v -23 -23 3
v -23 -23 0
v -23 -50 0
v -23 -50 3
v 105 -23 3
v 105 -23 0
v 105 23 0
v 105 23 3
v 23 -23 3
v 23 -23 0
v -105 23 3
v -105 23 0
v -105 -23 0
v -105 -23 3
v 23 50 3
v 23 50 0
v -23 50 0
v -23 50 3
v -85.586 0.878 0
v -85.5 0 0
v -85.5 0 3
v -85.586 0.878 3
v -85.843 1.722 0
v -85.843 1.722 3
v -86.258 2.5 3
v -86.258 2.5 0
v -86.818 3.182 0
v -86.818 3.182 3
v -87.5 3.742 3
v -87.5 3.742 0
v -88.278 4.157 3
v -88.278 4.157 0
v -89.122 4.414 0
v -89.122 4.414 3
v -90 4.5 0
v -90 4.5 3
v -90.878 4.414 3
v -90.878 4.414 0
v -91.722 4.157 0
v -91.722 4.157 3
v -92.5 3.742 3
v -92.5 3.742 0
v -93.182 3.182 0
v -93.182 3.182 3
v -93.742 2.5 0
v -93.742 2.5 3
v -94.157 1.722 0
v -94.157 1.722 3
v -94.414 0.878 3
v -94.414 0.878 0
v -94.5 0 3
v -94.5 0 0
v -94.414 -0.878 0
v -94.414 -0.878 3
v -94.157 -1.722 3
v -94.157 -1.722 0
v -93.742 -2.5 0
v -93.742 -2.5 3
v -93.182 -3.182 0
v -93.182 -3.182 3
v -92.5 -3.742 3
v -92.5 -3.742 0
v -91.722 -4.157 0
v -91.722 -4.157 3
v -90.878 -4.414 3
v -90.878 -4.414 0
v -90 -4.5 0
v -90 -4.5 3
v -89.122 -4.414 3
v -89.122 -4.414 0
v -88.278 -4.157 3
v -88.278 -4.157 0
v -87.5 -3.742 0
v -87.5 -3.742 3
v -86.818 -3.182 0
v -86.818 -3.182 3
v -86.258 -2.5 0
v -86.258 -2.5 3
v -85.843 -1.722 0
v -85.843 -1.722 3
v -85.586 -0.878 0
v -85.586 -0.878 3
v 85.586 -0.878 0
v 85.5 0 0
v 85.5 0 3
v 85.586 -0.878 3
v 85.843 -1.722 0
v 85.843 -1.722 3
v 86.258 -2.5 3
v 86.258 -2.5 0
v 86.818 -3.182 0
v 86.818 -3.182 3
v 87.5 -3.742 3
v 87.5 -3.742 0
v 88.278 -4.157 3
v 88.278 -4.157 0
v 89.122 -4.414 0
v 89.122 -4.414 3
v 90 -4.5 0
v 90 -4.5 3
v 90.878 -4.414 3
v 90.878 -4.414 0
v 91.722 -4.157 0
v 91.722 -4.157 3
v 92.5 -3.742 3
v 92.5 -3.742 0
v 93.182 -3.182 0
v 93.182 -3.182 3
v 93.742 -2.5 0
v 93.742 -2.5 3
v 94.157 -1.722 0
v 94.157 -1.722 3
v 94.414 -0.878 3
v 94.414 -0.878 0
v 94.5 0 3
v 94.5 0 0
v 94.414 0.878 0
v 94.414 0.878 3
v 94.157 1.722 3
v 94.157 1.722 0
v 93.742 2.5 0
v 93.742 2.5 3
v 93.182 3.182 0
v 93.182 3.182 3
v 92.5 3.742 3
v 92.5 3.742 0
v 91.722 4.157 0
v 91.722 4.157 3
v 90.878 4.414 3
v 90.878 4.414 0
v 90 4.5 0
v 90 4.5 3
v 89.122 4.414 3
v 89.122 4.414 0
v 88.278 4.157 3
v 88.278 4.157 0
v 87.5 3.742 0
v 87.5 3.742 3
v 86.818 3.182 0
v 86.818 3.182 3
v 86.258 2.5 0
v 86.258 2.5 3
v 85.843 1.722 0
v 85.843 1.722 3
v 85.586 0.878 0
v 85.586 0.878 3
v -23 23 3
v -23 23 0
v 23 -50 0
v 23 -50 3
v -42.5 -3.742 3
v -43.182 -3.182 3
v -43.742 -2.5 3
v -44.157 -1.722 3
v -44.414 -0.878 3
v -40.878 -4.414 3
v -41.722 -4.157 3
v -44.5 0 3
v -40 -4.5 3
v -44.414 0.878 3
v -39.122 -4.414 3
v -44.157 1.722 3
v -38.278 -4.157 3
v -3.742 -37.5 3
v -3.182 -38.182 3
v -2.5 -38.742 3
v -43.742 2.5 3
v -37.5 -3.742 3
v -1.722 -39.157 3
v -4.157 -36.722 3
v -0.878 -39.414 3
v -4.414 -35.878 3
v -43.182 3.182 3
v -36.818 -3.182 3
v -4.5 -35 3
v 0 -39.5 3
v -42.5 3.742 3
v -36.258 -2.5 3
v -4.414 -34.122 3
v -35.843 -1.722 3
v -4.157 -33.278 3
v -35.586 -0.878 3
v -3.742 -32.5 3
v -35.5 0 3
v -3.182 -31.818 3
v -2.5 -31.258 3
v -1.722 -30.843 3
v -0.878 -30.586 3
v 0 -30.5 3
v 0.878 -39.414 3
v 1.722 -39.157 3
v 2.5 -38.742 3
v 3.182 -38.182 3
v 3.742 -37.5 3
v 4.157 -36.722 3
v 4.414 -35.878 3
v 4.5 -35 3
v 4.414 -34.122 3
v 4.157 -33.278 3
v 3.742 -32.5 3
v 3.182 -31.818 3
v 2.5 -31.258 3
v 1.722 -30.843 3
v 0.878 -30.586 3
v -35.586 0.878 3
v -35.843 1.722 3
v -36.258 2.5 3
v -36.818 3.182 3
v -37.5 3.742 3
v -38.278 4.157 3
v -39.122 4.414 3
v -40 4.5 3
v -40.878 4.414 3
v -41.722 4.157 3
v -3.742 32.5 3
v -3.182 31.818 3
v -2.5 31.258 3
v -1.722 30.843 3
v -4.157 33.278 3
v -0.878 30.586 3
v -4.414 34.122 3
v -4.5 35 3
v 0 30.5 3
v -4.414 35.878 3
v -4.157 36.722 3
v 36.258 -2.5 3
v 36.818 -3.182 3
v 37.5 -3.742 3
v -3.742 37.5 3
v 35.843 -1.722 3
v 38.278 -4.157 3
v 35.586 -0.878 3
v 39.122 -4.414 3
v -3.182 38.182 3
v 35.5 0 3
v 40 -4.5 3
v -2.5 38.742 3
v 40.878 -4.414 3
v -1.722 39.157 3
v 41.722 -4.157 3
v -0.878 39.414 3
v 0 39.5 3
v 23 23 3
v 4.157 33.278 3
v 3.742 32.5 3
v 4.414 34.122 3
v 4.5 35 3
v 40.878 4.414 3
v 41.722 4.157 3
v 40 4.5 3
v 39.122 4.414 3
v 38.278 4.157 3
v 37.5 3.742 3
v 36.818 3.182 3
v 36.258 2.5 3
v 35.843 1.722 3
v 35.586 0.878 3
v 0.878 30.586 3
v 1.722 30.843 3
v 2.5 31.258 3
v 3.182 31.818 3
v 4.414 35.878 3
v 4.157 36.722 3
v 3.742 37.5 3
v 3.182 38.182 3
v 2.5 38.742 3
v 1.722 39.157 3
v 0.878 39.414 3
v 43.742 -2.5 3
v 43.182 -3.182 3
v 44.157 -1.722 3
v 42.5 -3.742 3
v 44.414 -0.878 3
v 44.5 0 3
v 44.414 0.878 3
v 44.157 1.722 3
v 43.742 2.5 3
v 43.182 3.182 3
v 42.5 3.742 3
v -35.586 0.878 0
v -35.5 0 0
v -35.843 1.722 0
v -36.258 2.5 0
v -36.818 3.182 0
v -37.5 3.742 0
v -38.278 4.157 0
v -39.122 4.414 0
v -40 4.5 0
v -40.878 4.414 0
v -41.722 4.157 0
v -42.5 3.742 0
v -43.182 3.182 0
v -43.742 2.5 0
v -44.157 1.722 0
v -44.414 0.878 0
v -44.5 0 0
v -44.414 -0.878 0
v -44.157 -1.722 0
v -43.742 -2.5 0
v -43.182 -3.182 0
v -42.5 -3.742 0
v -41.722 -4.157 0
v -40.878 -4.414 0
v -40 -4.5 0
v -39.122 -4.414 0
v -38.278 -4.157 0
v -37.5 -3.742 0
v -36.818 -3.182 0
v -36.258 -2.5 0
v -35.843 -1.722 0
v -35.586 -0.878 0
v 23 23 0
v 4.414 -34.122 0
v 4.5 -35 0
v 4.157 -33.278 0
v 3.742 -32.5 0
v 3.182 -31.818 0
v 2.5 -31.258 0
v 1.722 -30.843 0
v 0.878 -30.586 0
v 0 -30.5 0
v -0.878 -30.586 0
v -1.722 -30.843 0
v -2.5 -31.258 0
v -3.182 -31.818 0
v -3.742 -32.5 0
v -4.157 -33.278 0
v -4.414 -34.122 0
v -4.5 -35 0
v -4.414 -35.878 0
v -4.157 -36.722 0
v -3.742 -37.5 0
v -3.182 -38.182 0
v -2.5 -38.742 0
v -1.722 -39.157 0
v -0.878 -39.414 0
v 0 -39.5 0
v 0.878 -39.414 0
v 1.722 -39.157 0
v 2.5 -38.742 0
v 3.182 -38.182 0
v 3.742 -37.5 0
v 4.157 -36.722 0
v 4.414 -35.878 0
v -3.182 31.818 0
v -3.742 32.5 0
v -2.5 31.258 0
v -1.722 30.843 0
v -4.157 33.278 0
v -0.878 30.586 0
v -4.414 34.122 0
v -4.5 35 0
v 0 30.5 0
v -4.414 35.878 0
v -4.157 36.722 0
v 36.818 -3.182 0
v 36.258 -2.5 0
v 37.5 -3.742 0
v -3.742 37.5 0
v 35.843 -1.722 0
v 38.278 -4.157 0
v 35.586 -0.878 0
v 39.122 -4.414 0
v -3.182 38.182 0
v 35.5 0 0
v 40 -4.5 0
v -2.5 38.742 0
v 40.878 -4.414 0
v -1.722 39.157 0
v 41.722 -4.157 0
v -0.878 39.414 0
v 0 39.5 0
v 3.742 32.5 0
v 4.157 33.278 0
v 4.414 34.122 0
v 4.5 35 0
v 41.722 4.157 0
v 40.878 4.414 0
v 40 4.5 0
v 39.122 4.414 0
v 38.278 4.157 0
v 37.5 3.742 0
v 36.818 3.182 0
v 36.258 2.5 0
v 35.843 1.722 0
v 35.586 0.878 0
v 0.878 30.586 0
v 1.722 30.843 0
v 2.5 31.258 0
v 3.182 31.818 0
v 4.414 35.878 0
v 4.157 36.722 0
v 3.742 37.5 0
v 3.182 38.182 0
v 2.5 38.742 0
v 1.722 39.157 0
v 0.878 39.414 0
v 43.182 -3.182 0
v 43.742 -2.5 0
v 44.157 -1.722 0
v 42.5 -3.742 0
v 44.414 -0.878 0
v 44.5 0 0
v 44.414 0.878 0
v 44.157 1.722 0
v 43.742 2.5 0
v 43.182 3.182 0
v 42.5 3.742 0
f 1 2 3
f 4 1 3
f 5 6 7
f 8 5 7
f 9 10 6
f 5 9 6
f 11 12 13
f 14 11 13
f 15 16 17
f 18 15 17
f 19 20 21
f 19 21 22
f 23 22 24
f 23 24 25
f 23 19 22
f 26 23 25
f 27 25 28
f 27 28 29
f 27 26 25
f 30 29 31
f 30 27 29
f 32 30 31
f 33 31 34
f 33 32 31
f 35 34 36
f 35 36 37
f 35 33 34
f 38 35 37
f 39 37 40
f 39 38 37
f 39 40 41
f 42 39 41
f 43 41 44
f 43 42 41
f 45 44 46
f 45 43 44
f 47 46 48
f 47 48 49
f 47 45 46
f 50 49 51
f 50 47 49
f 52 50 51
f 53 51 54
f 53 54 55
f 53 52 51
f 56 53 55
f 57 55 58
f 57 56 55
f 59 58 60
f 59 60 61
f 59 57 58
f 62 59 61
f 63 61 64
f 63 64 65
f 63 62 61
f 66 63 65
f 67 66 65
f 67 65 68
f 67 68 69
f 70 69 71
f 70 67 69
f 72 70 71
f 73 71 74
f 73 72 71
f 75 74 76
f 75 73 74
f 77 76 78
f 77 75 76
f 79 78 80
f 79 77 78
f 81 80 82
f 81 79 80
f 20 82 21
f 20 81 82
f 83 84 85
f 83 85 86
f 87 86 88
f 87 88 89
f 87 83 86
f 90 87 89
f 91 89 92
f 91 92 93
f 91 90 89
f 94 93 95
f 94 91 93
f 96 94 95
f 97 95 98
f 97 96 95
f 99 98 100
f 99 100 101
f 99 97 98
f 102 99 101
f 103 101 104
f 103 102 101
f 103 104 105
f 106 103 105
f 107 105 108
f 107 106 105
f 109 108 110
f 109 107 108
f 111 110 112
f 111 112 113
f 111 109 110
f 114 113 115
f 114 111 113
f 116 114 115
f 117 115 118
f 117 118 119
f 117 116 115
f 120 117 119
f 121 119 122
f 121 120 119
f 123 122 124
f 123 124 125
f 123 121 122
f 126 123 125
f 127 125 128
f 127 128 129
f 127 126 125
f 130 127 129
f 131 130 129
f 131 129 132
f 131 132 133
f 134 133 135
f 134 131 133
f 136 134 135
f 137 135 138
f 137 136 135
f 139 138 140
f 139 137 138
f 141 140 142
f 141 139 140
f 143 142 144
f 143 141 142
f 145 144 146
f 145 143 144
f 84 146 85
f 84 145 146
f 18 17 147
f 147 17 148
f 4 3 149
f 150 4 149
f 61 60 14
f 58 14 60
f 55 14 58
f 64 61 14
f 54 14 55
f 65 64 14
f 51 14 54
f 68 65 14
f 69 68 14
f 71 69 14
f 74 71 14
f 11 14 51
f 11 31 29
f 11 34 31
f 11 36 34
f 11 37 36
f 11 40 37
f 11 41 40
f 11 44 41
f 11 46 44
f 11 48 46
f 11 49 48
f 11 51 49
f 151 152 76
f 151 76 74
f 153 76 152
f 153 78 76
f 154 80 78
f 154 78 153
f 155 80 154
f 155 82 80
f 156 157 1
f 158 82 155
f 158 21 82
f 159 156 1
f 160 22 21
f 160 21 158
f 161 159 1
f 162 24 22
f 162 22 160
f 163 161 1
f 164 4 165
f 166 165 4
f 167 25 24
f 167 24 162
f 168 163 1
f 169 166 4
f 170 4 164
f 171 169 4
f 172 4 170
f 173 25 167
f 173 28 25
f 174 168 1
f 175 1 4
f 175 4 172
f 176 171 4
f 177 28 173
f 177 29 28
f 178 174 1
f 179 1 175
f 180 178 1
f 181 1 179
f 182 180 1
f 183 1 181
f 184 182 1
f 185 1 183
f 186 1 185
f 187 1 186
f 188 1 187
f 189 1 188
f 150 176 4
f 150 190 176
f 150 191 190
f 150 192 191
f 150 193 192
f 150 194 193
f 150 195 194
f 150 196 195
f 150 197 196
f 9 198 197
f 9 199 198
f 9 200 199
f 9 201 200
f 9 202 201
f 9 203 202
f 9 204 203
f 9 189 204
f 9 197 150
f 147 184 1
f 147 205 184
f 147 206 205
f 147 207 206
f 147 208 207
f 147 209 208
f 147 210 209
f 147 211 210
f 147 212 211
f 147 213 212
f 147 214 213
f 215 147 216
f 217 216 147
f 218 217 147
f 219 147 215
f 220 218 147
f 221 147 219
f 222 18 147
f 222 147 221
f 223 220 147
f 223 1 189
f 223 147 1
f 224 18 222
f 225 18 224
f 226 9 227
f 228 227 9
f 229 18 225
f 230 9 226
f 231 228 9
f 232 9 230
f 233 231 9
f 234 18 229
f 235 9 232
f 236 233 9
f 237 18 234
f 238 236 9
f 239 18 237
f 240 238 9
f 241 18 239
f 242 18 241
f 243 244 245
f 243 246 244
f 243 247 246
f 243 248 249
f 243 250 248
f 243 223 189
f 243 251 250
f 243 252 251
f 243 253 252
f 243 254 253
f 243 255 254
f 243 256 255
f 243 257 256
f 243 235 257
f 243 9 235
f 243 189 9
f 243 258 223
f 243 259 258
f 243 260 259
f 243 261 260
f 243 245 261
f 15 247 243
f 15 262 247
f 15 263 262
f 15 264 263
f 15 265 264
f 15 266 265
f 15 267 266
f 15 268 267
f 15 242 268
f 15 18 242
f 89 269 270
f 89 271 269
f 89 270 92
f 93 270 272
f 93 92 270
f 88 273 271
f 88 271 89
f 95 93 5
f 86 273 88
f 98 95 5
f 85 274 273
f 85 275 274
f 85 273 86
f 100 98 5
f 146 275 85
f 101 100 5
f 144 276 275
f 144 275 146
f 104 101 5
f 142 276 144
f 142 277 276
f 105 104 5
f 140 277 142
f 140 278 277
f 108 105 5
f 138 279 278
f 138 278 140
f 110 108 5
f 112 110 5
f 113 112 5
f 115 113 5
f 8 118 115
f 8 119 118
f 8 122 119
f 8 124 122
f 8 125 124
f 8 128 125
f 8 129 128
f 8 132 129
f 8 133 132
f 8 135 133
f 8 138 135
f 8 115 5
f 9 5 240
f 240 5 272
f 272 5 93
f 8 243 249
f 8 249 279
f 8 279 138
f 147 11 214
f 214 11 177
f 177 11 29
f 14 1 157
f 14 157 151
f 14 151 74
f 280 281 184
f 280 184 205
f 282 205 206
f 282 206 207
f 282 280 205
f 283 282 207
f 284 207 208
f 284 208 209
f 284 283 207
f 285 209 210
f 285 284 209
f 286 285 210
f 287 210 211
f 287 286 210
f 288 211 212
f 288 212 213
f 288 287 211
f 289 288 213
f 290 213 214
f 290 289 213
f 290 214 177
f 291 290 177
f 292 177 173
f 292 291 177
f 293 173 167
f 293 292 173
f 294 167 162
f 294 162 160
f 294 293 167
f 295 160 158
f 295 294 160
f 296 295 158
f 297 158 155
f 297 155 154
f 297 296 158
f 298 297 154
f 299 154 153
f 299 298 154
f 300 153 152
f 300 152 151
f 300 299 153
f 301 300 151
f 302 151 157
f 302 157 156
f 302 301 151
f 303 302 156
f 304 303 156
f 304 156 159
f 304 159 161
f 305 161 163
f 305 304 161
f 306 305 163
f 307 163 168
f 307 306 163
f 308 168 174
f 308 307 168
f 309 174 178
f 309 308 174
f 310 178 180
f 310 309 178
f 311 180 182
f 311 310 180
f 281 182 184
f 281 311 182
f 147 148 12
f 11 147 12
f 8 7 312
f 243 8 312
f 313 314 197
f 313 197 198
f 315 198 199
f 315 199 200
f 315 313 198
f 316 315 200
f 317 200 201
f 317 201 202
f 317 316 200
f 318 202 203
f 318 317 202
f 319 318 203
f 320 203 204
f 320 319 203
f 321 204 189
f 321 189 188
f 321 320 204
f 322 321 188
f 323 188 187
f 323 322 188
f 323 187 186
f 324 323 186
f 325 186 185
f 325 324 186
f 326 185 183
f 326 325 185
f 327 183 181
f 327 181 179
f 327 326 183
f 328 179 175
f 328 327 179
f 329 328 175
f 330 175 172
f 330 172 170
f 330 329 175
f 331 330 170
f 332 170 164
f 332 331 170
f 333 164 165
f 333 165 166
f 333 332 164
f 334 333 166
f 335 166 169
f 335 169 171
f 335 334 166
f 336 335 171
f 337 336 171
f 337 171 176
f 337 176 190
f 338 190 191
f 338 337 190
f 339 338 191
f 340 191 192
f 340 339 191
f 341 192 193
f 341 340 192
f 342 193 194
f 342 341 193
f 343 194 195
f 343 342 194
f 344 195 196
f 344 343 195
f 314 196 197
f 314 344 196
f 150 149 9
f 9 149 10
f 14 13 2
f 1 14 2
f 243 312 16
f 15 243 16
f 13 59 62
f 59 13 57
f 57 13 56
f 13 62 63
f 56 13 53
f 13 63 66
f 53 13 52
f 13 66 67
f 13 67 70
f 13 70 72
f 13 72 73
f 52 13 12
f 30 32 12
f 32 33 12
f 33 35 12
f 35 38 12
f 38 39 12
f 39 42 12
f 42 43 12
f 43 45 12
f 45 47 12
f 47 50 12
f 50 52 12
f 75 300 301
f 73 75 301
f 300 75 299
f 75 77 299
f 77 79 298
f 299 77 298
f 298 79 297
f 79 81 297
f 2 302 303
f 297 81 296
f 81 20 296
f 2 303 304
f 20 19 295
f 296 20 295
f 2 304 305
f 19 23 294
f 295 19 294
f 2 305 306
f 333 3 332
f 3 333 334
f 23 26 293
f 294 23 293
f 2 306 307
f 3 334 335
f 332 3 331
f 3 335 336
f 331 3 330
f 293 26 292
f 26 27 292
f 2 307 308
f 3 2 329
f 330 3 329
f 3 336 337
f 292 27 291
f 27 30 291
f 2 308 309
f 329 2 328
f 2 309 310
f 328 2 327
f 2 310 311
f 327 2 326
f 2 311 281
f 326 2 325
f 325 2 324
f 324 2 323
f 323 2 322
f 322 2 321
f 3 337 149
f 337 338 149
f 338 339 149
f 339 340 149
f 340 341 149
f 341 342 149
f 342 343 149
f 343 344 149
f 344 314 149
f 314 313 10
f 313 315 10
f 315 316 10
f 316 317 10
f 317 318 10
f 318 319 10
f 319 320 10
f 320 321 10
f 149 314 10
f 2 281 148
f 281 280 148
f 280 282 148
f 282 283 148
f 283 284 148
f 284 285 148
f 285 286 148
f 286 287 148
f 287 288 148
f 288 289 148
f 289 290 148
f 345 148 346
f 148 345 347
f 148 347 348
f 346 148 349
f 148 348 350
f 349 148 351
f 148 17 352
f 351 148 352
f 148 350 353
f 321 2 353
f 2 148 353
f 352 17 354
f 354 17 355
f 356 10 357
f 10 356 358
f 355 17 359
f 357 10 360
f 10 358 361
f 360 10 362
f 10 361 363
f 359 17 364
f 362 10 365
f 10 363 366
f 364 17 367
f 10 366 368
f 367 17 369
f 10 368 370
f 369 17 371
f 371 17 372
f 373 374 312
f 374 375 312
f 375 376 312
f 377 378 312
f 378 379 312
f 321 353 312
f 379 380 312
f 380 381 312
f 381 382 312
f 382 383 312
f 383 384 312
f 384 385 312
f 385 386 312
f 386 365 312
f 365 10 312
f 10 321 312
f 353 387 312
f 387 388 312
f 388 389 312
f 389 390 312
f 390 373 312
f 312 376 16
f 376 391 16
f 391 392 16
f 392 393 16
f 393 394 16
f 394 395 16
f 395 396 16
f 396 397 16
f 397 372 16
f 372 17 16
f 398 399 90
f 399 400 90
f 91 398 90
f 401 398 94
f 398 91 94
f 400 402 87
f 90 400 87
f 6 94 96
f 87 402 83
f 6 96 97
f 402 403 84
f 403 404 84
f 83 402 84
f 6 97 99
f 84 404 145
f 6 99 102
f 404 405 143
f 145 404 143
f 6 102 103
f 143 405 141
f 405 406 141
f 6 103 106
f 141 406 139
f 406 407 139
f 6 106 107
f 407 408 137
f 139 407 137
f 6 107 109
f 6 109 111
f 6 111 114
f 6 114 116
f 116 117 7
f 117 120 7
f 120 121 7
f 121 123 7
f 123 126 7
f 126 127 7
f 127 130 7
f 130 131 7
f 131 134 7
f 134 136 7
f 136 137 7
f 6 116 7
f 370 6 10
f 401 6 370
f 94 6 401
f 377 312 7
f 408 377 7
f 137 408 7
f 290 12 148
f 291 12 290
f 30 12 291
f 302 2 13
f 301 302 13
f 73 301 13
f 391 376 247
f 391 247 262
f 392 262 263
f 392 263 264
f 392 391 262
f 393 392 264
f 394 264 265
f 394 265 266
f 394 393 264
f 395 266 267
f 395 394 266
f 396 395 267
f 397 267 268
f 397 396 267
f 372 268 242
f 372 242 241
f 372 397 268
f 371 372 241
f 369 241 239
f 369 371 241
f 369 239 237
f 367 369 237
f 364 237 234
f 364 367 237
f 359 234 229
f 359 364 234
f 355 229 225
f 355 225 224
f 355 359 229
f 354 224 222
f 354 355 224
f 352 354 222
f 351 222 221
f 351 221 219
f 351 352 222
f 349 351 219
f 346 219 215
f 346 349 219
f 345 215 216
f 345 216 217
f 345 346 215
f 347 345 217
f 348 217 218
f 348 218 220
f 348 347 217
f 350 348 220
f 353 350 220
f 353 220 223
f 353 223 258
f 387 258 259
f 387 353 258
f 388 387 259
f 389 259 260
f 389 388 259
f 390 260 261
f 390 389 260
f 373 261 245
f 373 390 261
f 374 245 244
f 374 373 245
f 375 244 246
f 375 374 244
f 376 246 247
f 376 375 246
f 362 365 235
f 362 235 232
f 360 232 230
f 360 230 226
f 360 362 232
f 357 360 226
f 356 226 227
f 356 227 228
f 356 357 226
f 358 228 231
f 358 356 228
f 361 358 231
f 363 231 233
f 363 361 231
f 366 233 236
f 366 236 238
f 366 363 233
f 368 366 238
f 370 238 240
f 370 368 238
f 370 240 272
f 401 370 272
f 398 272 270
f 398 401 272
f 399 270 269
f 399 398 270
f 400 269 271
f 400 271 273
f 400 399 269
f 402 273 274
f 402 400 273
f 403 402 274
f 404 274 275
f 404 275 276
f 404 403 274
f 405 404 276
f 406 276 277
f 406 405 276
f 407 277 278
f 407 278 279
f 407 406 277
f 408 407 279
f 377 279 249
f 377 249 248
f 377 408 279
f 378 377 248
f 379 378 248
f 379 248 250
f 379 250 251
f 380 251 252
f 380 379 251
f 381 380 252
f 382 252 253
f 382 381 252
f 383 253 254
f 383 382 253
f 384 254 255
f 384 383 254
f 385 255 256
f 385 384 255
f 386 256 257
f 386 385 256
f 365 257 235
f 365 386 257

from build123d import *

# Parameters (mm, degrees)
SKETCH_1_R      = 4.5
EXTRUDE_1_DEPTH = 3


with BuildPart() as part:
    # Эскиз1 → Бобышка-Вытянуть1 (new body)
    with BuildSketch(Plane.XY):
        Polygon((23, -23), (105, -23), (105, 23), (23, 23), (23, 50), (-23, 50), (-23, 23), (-105, 23), (-105, -23), (-23, -23), (-23, -50), (23, -50), align=None)
        with Locations((0, 35)):
            Circle(SKETCH_1_R, mode=Mode.SUBTRACT)
        with Locations((0, -35)):
            Circle(SKETCH_1_R, mode=Mode.SUBTRACT)
        with Locations((-90, 0)):
            Circle(SKETCH_1_R, mode=Mode.SUBTRACT)
        with Locations((-40, 0)):
            Circle(SKETCH_1_R, mode=Mode.SUBTRACT)
        with Locations(Location((40, 0, 0), (0, 0, 180))):  # turned: the seam where the file's is
            Circle(SKETCH_1_R, mode=Mode.SUBTRACT)
        with Locations(Location((90, 0, 0), (0, 0, 180))):  # turned: the seam where the file's is
            Circle(SKETCH_1_R, mode=Mode.SUBTRACT)
    extrude(amount=EXTRUDE_1_DEPTH)


solid = part.part
